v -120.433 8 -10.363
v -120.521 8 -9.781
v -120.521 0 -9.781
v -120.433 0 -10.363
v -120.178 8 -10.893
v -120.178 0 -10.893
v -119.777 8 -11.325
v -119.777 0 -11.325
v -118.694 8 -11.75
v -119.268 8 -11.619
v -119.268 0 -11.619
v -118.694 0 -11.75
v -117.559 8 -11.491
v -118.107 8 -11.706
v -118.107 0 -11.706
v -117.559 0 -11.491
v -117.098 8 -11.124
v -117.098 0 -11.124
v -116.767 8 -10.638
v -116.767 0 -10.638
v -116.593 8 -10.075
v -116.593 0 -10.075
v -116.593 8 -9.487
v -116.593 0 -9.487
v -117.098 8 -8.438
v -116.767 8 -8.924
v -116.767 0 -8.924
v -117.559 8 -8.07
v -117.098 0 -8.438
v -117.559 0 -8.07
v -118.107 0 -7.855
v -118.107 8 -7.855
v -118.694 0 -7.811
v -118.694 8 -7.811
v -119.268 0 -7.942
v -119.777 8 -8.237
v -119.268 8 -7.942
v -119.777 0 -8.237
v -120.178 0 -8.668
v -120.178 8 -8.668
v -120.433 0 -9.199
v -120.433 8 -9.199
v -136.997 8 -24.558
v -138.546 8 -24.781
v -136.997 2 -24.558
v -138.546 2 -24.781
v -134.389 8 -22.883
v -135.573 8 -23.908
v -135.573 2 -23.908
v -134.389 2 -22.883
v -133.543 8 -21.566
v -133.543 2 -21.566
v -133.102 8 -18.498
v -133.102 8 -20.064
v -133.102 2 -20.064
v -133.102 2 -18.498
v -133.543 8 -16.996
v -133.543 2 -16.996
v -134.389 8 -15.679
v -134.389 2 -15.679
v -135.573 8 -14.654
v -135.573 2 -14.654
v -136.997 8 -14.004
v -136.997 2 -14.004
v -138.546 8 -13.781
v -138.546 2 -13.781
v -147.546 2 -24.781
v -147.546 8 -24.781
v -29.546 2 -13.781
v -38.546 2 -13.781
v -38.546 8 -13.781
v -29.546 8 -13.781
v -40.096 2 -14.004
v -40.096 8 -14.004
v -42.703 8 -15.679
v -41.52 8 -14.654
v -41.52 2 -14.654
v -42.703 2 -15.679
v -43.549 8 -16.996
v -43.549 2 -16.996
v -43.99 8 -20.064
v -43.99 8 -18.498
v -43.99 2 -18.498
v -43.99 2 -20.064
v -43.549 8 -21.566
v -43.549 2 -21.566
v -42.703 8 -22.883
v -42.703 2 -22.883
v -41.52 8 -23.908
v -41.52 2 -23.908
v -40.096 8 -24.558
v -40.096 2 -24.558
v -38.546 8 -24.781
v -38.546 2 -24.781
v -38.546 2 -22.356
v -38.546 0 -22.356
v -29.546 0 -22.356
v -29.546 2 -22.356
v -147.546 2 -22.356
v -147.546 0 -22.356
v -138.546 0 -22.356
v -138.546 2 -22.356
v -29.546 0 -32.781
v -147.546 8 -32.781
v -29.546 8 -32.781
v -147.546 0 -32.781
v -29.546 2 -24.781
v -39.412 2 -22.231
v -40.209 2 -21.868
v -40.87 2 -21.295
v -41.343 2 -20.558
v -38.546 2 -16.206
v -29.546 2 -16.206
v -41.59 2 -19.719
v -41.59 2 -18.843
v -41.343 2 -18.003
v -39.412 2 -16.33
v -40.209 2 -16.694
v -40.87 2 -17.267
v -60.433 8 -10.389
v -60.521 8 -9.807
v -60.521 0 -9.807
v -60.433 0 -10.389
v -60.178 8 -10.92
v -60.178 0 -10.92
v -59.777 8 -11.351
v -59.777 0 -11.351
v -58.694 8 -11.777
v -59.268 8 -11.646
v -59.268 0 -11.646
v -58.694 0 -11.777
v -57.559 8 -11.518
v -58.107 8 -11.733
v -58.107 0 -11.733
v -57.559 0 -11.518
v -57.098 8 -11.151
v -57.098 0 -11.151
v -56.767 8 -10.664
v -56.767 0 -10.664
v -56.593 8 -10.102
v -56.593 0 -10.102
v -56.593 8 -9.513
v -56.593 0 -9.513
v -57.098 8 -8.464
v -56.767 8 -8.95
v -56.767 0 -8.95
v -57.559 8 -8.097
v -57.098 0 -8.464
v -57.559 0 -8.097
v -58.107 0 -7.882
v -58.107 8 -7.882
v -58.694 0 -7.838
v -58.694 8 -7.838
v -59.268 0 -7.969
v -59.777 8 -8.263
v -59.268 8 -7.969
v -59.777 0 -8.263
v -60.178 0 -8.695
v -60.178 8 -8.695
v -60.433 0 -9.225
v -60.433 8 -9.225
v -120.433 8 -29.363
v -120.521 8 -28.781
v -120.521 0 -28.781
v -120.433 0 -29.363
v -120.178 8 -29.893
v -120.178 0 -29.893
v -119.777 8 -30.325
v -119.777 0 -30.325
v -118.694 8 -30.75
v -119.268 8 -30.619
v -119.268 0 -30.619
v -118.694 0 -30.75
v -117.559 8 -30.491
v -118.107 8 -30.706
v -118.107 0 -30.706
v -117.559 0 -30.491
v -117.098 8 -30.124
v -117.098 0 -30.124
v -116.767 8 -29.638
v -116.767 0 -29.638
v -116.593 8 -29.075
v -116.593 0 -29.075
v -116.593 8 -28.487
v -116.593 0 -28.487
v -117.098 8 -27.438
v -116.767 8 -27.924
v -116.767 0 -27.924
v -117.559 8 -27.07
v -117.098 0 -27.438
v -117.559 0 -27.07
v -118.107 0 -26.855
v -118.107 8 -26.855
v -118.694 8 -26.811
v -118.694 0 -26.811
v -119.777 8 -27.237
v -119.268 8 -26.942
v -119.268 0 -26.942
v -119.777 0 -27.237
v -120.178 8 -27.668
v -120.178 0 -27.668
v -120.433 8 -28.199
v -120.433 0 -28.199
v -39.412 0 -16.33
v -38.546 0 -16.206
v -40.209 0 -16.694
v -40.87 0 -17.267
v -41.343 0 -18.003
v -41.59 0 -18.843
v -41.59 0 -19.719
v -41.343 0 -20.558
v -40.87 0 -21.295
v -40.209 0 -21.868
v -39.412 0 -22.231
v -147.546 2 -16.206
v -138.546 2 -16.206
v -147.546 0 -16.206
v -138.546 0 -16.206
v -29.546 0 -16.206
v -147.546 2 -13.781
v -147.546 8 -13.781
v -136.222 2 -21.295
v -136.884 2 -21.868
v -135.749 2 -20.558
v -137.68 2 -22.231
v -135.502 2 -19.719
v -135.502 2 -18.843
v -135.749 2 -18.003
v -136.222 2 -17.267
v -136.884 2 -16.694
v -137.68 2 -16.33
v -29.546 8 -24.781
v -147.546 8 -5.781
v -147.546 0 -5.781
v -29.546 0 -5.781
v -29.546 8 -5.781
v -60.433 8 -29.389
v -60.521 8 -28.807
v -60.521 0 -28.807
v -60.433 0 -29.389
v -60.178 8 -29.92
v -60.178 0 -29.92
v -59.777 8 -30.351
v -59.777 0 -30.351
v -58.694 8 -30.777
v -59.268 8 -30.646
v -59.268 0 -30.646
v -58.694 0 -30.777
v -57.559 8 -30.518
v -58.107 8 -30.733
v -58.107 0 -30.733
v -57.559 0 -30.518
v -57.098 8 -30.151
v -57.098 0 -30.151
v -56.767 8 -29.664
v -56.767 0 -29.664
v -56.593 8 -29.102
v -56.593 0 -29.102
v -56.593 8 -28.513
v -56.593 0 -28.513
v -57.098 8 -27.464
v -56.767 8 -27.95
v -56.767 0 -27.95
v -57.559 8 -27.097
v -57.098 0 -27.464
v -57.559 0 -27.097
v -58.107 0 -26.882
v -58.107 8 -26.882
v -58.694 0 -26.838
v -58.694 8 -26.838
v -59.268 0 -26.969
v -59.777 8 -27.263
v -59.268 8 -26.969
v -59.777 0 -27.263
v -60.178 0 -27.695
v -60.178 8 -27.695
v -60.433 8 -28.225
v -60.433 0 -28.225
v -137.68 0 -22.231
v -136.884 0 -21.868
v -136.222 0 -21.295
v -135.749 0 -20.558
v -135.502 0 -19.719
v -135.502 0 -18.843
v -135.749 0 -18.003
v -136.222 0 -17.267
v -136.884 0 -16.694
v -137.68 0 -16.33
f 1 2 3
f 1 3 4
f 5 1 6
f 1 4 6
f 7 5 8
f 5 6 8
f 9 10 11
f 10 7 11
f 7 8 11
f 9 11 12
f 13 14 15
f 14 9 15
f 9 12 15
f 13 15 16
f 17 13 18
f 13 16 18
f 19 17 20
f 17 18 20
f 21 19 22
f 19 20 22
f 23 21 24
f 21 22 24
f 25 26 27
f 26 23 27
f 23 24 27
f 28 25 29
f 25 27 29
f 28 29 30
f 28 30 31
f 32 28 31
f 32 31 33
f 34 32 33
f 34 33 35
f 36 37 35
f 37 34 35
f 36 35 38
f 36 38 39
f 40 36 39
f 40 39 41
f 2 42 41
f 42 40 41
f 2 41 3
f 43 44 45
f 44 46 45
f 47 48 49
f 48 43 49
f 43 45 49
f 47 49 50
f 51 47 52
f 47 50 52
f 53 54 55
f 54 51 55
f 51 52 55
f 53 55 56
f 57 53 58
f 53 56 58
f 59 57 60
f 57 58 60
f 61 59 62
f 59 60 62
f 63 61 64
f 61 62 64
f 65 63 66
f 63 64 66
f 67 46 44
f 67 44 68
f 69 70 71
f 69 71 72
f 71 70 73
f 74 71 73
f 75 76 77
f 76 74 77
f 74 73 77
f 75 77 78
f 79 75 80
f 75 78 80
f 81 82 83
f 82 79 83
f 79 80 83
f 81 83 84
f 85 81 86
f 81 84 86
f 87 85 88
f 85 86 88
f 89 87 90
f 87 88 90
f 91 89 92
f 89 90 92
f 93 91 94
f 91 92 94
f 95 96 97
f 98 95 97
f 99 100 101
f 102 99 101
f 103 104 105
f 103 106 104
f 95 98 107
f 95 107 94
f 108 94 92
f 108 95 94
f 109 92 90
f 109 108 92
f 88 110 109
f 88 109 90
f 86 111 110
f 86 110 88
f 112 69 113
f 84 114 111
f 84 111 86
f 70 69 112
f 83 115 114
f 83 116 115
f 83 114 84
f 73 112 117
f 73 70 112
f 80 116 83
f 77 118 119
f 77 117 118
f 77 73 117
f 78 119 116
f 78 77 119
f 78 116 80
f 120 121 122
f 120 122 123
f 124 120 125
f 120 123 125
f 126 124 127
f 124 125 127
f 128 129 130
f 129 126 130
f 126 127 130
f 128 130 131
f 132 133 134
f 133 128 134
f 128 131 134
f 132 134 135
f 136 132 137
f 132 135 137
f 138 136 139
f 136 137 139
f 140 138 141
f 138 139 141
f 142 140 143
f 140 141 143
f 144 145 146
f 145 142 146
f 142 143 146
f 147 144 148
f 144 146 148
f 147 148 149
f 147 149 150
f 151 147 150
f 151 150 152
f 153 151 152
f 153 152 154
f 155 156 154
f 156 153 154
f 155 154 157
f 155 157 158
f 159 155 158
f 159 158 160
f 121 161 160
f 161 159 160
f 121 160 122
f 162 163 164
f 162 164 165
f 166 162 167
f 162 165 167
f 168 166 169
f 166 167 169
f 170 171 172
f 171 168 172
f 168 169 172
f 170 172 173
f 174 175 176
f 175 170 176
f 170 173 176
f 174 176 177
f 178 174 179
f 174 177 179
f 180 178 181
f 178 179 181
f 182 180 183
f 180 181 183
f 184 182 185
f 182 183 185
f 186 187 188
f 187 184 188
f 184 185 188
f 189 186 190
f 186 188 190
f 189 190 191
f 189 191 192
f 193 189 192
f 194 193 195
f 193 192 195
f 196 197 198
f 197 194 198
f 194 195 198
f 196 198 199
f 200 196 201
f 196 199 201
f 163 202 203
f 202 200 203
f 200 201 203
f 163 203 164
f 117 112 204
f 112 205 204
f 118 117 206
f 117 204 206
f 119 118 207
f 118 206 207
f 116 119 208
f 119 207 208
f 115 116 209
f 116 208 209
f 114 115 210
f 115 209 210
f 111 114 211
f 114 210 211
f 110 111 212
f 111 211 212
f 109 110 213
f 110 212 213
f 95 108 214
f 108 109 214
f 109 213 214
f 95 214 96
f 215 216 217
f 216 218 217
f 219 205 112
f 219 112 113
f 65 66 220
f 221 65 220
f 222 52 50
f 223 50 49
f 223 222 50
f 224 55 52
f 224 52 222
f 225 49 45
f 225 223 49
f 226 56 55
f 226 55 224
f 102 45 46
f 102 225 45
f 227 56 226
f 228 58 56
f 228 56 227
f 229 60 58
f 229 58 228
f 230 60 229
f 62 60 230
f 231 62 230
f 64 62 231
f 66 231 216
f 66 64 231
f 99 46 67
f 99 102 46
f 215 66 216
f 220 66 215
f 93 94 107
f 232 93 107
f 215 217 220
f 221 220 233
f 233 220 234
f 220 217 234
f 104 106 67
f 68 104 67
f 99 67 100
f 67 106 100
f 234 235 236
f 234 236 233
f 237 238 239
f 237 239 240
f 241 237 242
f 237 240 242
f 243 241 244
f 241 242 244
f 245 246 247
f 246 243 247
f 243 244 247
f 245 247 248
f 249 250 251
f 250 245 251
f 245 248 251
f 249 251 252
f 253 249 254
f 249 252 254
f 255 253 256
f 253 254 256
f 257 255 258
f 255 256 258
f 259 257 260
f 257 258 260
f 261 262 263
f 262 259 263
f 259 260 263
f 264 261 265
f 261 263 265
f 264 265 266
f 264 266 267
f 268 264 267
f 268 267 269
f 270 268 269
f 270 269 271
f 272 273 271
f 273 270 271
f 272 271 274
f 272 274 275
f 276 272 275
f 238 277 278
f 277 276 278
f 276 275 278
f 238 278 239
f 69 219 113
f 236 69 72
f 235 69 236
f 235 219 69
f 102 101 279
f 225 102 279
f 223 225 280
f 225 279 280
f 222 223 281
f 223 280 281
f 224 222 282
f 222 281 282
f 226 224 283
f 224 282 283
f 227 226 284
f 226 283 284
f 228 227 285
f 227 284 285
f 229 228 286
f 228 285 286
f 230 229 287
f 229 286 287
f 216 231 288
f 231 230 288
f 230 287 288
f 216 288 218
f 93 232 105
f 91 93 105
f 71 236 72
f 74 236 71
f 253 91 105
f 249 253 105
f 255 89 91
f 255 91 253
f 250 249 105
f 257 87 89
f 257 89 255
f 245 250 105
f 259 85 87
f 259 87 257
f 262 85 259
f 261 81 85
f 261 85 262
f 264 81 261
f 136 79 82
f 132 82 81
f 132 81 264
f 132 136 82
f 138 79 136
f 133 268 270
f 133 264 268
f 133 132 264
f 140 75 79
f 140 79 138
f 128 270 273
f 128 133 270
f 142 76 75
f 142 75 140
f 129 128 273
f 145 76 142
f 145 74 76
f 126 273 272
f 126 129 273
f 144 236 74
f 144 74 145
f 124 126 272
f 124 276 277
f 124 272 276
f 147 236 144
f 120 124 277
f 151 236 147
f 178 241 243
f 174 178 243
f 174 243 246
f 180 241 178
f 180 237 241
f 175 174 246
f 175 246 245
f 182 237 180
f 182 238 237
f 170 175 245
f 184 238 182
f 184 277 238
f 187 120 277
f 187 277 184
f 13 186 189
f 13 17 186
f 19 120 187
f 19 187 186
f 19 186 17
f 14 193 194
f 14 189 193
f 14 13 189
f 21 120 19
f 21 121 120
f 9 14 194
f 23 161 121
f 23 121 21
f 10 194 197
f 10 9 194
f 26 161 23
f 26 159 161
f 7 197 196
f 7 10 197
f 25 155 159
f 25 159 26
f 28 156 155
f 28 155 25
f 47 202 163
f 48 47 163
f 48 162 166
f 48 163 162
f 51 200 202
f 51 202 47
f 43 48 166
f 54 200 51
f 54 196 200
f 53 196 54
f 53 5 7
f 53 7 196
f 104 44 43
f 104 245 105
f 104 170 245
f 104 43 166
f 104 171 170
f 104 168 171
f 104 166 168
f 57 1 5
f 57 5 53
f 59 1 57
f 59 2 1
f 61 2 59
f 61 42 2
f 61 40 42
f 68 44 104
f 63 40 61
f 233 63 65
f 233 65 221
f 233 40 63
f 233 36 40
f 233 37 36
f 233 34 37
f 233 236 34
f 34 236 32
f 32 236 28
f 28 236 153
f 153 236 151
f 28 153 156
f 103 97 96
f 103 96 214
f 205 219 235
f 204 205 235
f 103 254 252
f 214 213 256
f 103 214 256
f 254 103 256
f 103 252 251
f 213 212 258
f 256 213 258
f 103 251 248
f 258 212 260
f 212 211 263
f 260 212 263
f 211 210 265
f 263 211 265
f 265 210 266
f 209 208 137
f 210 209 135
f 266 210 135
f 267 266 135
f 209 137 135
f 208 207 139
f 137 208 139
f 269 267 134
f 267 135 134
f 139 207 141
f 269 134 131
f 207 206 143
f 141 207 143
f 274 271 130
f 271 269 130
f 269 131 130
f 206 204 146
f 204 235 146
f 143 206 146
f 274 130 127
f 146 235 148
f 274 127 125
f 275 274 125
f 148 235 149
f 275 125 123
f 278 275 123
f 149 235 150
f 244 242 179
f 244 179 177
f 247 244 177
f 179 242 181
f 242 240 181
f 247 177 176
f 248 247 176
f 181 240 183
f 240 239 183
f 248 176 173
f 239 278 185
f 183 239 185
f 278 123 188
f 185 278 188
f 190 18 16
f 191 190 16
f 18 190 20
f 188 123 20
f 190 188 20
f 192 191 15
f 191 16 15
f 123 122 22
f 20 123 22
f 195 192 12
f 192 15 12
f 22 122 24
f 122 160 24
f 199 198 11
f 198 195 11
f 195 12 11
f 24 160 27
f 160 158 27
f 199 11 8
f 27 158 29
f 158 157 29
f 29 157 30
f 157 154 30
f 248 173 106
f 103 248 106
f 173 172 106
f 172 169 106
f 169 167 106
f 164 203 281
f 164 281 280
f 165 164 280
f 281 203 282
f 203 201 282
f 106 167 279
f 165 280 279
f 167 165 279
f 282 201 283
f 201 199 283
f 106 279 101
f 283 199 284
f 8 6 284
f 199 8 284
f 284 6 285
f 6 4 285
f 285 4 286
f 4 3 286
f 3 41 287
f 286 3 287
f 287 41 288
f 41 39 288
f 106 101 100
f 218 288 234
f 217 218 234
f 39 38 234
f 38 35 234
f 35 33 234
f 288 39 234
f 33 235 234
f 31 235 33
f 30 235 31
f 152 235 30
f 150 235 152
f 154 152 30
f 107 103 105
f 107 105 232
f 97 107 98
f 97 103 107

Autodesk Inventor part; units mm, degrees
ref_plane "YZ Plane" through (0, 0, 0) normal (1, 0, 0) x (0, 1, 0)
ref_plane "XZ Plane" through (0, 0, 0) normal (0, 1, 0) x (-1, 0, 0)
ref_plane "XY Plane" through (0, 0, 0) normal (0, 0, 1) x (1, 0, 0)
sketch "Sketch1" plane through (0, 0, 0) normal (0, 1, 0) x (-1, 0, 0)
  circle A0 centre (118.5461, -28.7809) radius 1.975
  circle A1 centre (118.5461, -9.7809) radius 1.975
  arc A2 (138.5461, -13.7809) -> (138.5461, -24.7809) centre (138.5461, -19.2809) ccw
  circle A3 centre (58.5461, -28.8073) radius 1.975
  line L0 (147.5461, -32.7809) -> (29.5461, -32.7809)
  line L1 (29.5461, -5.7809) -> (147.5461, -5.7809)
  arc A4 (38.5461, -24.7809) -> (38.5461, -13.7809) centre (38.5461, -19.2809) ccw
  line L2 (29.5461, -32.7809) -> (29.5461, -5.7809)
  circle A5 centre (58.5461, -9.8073) radius 1.975
  arc A6 (138.5461, -16.2059) -> (138.5461, -22.3559) centre (138.5461, -19.2809) ccw
  arc A7 (38.5461, -22.3559) -> (38.5461, -16.2059) centre (38.5461, -19.2809) ccw
  line L3 (143.1062, -22.3559) -> (147.5461, -22.3559)
  line L4 (143.1062, -16.2059) -> (147.5461, -16.2059)
  line L5 (147.5461, -32.7809) -> (147.5461, -22.3559)
  line L6 (147.5461, -16.2059) -> (147.5461, -5.7809)
  line L7 (143.1062, -22.3559) -> (138.5461, -22.3559)
  line L8 (143.1062, -16.2059) -> (138.5461, -16.2059)
  line L9 (138.5461, -24.7809) -> (147.5461, -24.7809)
  line L10 (138.5461, -13.7809) -> (147.5461, -13.7809)
  line L11 (38.5461, -22.3559) -> (29.5461, -22.3559)
  line L12 (38.5461, -24.7809) -> (29.5461, -24.7809)
  line L13 (38.5461, -16.2059) -> (29.5461, -16.2059)
  line L14 (38.5461, -13.7809) -> (29.5461, -13.7809)
  point P0 (88.5461, -32.7809)
  point P1 (88.5461, -5.7809)
  dimension "d162" = 60
  dimension "d163" = 60
  dimension "d165" = 100
  dimension "d183" = 11
  dimension "d184" = 11
  dimension "d185" = 6.15
  dimension "d186" = 6.15
  dimension "d187" = 3.95
  dimension "d188" = 3.95
  dimension "d189" = 3.95
  dimension "d190" = 3.95
  dimension "d202" = 9
  dimension "d203" = 9
  dimension "d204" = 9
  dimension "d212" = 19
  dimension "d213" = 19
  dimension "d214" = 27
  dimension "d215" = 4
  dimension "d216" = 4
  dimension "d217" = 13.5
  dimension "d218" = 30
  dimension "d219" = 30
extrude "Extrusion13" add sketch "Sketch1" along normal blind 8 contours A2 L9 L5 L0 L2 L12 A4 L14 L1 L6 L10
extrude "Extrusion14" add sketch "Sketch1" along normal blind 2 contours L14 A4 L12 L2 L11 A7 L13
extrude "Extrusion15" add sketch "Sketch1" along normal blind 2 contours L10 L6 L4 L8 A6 L7 L3 L5 L9 A2
properties part number "Base Laser_3DPrint"
